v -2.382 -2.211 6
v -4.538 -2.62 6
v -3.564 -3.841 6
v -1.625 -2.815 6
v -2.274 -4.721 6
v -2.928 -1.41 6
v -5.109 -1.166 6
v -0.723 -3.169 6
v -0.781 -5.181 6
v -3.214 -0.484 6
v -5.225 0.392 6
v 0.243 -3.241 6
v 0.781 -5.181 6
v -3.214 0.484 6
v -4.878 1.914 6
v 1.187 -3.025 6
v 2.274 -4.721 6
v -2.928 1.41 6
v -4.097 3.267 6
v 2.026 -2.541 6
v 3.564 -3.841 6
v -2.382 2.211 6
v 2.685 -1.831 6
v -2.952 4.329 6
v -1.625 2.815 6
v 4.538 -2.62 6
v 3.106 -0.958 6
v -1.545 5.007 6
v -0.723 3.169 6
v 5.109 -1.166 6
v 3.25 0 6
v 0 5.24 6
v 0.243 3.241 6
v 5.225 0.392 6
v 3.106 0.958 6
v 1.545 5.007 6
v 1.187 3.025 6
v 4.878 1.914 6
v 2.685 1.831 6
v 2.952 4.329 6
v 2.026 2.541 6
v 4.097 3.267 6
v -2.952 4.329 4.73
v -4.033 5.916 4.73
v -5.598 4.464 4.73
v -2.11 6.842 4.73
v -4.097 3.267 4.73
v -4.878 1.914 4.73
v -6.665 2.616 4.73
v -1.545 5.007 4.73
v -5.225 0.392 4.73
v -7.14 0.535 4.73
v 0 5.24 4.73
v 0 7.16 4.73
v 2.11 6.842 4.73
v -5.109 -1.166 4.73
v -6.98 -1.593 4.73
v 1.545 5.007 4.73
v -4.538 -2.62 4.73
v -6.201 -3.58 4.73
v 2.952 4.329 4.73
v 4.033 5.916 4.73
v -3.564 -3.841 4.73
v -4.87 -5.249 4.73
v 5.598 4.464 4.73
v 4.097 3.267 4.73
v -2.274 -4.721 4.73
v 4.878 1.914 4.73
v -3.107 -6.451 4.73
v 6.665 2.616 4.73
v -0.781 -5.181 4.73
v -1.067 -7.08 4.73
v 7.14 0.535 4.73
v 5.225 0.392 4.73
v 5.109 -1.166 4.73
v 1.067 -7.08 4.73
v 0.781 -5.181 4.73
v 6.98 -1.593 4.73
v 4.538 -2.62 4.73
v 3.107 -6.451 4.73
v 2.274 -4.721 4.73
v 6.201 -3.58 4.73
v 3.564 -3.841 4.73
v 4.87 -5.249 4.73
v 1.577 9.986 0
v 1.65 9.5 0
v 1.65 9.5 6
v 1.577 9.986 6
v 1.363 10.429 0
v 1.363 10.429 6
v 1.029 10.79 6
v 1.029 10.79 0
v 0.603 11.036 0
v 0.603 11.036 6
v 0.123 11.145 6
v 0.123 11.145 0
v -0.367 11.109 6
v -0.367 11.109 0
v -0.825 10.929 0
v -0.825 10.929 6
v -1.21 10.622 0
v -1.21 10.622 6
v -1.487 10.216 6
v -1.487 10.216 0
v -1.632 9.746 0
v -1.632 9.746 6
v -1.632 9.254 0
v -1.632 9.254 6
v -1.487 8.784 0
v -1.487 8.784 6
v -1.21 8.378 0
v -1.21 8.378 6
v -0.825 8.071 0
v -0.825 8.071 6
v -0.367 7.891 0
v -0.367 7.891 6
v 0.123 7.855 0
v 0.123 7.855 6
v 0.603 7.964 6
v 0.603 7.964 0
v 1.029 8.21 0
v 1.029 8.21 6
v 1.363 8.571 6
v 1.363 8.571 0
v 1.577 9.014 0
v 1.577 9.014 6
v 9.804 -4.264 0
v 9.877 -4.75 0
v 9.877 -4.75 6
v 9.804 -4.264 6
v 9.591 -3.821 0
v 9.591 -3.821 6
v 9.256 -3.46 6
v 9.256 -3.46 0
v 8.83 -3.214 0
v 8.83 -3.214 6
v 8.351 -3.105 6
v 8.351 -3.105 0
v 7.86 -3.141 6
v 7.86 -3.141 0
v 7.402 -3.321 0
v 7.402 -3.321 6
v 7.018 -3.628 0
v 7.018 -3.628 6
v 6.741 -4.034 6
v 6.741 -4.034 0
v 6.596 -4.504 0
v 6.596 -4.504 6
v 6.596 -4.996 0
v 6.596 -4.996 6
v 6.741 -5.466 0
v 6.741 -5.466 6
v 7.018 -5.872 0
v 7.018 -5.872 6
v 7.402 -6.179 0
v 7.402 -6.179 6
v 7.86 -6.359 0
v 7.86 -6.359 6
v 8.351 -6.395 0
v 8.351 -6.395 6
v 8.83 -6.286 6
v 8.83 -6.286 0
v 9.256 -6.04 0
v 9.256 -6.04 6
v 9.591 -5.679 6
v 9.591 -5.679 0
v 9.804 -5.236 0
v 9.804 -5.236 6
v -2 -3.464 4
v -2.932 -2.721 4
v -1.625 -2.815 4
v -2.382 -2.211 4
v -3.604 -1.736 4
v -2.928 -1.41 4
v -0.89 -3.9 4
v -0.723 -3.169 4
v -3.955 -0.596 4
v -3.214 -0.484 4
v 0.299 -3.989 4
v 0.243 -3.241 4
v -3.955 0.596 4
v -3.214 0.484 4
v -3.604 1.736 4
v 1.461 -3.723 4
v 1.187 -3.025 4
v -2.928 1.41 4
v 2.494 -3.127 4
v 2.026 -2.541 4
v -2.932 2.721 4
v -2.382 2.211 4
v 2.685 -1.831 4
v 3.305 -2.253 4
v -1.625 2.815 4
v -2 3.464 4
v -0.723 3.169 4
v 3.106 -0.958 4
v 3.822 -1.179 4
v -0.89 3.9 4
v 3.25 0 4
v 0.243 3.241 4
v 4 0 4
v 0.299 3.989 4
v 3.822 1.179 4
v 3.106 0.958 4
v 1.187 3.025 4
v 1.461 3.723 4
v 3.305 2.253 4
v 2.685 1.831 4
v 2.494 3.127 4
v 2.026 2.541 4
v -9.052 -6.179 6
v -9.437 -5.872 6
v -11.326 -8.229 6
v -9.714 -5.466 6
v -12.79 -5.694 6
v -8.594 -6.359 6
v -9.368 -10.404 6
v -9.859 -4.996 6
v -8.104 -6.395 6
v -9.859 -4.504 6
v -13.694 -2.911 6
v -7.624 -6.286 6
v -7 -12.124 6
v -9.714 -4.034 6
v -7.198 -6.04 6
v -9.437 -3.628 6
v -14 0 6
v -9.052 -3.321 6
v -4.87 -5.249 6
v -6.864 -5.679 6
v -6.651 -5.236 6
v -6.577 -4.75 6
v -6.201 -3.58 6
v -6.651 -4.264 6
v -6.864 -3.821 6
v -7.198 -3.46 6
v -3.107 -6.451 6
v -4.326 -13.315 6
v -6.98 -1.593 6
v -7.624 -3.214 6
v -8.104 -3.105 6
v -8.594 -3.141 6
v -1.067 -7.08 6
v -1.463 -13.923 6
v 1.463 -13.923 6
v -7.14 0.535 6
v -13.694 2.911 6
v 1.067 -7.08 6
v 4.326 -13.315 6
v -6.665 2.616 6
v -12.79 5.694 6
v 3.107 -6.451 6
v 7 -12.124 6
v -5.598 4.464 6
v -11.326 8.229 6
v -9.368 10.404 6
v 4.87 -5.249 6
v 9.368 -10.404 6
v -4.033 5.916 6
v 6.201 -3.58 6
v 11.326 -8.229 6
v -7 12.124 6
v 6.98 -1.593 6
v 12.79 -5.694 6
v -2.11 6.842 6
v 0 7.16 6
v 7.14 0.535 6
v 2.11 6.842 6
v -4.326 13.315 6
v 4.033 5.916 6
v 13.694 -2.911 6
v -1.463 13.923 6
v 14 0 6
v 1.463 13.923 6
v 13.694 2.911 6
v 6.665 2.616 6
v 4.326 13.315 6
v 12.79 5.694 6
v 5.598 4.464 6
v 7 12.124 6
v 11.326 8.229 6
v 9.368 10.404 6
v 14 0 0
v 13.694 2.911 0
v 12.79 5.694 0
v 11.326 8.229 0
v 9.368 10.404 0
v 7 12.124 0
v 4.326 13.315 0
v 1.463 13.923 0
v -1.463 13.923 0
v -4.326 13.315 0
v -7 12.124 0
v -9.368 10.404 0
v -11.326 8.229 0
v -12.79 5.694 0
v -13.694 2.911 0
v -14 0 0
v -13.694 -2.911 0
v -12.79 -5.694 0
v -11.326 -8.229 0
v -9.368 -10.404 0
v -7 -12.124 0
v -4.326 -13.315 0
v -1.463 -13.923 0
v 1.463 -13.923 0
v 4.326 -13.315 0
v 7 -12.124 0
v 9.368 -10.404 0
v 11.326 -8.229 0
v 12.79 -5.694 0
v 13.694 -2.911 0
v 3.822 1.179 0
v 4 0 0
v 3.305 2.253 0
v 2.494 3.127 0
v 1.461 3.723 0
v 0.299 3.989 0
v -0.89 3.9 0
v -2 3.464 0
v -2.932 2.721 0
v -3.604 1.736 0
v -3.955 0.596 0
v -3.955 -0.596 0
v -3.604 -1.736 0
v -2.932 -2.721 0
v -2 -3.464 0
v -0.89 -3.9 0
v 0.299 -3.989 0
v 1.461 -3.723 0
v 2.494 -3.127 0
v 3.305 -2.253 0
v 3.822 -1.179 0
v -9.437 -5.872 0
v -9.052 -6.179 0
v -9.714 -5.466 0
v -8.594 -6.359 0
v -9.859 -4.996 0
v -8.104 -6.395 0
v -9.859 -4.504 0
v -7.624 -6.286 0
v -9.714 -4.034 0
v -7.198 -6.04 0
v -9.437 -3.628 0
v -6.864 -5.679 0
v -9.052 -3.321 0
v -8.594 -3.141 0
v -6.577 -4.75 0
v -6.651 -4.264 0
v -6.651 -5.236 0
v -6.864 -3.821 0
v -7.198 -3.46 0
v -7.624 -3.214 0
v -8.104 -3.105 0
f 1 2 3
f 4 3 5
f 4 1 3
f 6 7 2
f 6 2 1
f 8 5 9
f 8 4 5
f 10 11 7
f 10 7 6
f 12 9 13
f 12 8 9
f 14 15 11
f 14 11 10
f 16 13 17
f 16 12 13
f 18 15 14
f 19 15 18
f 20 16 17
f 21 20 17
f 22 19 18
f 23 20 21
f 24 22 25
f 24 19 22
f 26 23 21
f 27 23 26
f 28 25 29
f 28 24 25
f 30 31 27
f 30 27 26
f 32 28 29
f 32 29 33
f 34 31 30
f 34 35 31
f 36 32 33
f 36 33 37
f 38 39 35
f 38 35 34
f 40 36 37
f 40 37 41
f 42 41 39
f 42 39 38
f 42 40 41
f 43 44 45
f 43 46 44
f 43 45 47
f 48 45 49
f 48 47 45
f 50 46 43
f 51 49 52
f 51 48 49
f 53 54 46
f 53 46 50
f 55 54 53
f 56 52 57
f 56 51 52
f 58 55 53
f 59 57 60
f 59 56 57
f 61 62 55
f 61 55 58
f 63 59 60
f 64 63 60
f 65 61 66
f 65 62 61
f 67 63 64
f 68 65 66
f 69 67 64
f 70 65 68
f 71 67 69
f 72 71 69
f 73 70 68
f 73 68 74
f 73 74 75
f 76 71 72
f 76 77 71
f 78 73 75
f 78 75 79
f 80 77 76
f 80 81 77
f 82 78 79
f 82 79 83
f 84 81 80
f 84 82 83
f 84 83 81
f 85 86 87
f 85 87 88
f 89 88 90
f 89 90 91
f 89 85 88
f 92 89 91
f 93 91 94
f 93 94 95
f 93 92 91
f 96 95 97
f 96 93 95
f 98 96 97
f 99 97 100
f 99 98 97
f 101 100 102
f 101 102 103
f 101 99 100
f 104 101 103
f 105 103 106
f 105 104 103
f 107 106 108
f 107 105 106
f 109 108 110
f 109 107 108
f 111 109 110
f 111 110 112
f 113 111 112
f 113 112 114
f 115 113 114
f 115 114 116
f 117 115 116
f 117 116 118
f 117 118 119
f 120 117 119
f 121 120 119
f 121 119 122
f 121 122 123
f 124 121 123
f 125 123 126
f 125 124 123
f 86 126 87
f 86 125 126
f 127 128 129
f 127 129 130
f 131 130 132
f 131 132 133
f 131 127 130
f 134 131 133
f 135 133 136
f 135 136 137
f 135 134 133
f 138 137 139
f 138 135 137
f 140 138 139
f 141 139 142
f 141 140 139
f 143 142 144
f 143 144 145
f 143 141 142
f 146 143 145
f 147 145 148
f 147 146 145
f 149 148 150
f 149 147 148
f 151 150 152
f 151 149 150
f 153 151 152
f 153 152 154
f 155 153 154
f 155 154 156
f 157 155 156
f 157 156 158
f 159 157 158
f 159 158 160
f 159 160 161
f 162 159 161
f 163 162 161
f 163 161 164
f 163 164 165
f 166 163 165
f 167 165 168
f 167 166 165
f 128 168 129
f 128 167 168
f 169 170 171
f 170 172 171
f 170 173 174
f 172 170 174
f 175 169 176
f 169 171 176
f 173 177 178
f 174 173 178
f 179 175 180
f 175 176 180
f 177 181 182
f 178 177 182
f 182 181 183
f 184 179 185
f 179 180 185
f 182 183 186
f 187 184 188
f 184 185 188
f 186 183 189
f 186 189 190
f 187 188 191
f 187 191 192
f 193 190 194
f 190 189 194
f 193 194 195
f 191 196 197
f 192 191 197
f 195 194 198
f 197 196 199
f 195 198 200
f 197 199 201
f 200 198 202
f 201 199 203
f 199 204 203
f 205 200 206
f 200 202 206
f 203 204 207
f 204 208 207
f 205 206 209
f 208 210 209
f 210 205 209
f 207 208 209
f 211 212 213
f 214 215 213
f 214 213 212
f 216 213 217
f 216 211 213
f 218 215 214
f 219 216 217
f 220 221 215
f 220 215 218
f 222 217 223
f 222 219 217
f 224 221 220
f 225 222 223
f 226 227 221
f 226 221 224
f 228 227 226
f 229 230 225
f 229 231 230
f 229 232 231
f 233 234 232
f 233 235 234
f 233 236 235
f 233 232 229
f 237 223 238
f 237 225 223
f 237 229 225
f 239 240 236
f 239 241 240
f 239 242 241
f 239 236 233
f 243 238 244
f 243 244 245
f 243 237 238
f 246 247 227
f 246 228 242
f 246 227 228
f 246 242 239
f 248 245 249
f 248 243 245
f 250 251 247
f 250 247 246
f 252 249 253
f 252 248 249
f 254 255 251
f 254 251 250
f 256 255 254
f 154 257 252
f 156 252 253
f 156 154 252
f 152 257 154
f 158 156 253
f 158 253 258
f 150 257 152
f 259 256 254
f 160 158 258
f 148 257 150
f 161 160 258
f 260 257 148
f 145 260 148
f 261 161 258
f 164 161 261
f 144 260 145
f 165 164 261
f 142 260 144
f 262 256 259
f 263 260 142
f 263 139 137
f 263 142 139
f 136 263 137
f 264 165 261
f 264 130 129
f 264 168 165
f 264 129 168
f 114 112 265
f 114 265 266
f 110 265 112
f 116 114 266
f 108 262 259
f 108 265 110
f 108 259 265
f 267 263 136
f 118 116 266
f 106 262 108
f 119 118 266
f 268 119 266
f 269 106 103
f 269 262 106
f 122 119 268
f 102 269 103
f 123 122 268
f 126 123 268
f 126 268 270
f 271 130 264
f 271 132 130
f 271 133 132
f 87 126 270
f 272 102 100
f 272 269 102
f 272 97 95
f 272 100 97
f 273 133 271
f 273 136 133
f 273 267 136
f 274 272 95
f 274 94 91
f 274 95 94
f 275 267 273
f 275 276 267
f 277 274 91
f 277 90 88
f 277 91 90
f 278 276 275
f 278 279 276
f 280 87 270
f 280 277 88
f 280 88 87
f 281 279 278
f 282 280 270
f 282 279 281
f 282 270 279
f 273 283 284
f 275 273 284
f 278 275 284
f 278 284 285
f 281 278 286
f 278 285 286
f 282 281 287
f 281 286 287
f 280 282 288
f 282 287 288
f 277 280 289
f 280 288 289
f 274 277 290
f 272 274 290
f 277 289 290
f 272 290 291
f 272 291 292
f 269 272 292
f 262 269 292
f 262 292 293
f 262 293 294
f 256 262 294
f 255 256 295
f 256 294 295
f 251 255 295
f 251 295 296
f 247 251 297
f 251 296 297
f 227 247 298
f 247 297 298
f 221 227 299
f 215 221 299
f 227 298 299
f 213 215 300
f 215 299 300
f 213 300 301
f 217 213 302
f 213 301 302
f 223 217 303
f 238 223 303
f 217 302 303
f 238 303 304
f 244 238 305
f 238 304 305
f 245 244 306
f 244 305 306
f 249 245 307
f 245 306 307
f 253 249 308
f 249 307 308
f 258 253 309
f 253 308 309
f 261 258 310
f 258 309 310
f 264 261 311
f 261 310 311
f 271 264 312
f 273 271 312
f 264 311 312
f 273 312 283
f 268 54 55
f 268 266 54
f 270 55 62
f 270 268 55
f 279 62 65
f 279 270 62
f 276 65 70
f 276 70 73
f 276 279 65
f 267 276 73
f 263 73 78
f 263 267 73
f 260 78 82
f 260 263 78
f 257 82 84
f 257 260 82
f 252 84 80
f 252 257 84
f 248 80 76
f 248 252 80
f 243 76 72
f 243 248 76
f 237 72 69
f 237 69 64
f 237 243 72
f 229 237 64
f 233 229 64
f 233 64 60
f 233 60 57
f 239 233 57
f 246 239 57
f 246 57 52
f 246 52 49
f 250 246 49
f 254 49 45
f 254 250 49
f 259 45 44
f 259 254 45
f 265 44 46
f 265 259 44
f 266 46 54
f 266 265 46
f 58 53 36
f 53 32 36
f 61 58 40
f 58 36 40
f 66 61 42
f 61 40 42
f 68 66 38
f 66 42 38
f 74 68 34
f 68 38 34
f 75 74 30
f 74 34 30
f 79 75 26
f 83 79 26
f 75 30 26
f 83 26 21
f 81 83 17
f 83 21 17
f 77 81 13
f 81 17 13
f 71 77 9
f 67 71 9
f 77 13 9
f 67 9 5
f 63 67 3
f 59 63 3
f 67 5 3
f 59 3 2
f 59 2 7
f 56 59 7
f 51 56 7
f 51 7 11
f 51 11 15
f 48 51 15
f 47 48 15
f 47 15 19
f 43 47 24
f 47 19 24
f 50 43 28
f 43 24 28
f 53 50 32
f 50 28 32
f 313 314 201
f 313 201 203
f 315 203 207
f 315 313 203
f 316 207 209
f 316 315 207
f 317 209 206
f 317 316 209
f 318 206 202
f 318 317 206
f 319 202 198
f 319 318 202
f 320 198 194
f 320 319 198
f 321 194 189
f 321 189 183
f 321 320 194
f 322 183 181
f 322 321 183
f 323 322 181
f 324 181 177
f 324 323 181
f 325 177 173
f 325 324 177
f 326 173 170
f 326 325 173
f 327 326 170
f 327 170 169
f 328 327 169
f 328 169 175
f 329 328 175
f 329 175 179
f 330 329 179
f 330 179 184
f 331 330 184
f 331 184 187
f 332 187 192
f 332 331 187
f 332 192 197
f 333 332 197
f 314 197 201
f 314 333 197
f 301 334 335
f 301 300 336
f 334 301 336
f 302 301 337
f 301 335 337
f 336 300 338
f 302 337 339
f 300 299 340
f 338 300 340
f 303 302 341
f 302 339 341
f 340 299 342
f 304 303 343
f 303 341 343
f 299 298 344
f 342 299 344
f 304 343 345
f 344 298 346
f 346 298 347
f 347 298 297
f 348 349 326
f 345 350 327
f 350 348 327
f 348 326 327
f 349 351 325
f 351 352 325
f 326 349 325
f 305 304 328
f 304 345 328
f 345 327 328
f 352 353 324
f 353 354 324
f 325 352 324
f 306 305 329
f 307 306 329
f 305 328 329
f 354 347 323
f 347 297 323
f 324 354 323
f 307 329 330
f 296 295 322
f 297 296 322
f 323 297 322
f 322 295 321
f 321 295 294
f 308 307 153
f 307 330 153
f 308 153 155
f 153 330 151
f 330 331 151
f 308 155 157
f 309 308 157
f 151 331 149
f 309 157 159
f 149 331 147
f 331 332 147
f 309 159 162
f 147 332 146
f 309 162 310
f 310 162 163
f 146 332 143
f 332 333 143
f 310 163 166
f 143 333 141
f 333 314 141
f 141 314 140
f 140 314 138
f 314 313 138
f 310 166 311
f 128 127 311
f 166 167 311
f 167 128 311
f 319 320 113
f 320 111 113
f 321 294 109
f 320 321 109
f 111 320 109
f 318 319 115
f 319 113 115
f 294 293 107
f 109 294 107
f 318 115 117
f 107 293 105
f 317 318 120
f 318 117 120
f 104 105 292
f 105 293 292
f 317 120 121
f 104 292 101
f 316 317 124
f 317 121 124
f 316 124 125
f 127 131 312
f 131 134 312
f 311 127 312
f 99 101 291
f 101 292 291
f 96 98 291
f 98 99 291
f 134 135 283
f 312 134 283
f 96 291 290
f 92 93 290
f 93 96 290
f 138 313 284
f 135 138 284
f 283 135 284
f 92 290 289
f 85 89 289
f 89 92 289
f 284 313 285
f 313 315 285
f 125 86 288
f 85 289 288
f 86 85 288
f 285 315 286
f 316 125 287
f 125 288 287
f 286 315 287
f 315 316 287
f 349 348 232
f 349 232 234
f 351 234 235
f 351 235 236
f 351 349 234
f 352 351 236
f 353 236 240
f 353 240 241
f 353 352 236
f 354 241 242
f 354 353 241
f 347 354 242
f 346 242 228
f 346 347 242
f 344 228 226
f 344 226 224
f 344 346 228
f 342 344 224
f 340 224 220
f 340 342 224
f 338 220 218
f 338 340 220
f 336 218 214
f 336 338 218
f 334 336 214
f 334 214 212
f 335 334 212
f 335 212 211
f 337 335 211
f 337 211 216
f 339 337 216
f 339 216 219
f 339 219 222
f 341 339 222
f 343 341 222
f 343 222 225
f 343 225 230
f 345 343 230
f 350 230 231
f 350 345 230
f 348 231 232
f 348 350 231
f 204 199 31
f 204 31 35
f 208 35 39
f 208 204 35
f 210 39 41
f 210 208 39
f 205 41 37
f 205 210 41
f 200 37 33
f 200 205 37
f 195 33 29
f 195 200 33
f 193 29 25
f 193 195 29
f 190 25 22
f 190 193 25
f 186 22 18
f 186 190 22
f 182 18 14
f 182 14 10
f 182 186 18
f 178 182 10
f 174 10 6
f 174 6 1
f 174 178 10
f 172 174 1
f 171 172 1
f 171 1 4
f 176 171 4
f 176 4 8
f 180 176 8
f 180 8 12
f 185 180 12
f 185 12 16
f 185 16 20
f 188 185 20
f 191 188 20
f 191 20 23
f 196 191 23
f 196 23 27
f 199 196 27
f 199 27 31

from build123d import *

# Parameters (mm, degrees)
F0_R     = 14
F0_R_2   = 1.65
F0_R_3   = 4
F0_R_4   = 3.25
F1_DEPTH = 6
F2_W     = 1.92
F2_H     = 1.27
F4_DEPTH = 4


with BuildPart() as f1:
    # F0 (on Top) → F1 (new body)
    with BuildSketch(Plane.XY):
        Circle(F0_R)
        with Locations((-8.227241, -4.75)):
            Circle(F0_R_2, mode=Mode.SUBTRACT)
        with Locations((8.227241, -4.75)):
            Circle(F0_R_2, mode=Mode.SUBTRACT)
        Circle(F0_R_3, mode=Mode.SUBTRACT)
        with Locations((0, 9.5)):
            Circle(F0_R_2, mode=Mode.SUBTRACT)
        Circle(F0_R_3)
        Circle(F0_R_4, mode=Mode.SUBTRACT)
    extrude(amount=F1_DEPTH)

    # F2 (on Right) → F3 (revolve, cut)
    with BuildSketch(Plane.YZ):
        with Locations((6.2, 5.365)):
            Rectangle(F2_W, F2_H)
    revolve(axis=Axis((0, 0, 1.894894), (0, 0, -1)), mode=Mode.SUBTRACT)

    # F0 (on Top) → F4 (cut)
    with BuildSketch(Plane.XY):
        Circle(F0_R_3)
        Circle(F0_R_4, mode=Mode.SUBTRACT)
    extrude(amount=F4_DEPTH, mode=Mode.SUBTRACT)


solid = f1.part
